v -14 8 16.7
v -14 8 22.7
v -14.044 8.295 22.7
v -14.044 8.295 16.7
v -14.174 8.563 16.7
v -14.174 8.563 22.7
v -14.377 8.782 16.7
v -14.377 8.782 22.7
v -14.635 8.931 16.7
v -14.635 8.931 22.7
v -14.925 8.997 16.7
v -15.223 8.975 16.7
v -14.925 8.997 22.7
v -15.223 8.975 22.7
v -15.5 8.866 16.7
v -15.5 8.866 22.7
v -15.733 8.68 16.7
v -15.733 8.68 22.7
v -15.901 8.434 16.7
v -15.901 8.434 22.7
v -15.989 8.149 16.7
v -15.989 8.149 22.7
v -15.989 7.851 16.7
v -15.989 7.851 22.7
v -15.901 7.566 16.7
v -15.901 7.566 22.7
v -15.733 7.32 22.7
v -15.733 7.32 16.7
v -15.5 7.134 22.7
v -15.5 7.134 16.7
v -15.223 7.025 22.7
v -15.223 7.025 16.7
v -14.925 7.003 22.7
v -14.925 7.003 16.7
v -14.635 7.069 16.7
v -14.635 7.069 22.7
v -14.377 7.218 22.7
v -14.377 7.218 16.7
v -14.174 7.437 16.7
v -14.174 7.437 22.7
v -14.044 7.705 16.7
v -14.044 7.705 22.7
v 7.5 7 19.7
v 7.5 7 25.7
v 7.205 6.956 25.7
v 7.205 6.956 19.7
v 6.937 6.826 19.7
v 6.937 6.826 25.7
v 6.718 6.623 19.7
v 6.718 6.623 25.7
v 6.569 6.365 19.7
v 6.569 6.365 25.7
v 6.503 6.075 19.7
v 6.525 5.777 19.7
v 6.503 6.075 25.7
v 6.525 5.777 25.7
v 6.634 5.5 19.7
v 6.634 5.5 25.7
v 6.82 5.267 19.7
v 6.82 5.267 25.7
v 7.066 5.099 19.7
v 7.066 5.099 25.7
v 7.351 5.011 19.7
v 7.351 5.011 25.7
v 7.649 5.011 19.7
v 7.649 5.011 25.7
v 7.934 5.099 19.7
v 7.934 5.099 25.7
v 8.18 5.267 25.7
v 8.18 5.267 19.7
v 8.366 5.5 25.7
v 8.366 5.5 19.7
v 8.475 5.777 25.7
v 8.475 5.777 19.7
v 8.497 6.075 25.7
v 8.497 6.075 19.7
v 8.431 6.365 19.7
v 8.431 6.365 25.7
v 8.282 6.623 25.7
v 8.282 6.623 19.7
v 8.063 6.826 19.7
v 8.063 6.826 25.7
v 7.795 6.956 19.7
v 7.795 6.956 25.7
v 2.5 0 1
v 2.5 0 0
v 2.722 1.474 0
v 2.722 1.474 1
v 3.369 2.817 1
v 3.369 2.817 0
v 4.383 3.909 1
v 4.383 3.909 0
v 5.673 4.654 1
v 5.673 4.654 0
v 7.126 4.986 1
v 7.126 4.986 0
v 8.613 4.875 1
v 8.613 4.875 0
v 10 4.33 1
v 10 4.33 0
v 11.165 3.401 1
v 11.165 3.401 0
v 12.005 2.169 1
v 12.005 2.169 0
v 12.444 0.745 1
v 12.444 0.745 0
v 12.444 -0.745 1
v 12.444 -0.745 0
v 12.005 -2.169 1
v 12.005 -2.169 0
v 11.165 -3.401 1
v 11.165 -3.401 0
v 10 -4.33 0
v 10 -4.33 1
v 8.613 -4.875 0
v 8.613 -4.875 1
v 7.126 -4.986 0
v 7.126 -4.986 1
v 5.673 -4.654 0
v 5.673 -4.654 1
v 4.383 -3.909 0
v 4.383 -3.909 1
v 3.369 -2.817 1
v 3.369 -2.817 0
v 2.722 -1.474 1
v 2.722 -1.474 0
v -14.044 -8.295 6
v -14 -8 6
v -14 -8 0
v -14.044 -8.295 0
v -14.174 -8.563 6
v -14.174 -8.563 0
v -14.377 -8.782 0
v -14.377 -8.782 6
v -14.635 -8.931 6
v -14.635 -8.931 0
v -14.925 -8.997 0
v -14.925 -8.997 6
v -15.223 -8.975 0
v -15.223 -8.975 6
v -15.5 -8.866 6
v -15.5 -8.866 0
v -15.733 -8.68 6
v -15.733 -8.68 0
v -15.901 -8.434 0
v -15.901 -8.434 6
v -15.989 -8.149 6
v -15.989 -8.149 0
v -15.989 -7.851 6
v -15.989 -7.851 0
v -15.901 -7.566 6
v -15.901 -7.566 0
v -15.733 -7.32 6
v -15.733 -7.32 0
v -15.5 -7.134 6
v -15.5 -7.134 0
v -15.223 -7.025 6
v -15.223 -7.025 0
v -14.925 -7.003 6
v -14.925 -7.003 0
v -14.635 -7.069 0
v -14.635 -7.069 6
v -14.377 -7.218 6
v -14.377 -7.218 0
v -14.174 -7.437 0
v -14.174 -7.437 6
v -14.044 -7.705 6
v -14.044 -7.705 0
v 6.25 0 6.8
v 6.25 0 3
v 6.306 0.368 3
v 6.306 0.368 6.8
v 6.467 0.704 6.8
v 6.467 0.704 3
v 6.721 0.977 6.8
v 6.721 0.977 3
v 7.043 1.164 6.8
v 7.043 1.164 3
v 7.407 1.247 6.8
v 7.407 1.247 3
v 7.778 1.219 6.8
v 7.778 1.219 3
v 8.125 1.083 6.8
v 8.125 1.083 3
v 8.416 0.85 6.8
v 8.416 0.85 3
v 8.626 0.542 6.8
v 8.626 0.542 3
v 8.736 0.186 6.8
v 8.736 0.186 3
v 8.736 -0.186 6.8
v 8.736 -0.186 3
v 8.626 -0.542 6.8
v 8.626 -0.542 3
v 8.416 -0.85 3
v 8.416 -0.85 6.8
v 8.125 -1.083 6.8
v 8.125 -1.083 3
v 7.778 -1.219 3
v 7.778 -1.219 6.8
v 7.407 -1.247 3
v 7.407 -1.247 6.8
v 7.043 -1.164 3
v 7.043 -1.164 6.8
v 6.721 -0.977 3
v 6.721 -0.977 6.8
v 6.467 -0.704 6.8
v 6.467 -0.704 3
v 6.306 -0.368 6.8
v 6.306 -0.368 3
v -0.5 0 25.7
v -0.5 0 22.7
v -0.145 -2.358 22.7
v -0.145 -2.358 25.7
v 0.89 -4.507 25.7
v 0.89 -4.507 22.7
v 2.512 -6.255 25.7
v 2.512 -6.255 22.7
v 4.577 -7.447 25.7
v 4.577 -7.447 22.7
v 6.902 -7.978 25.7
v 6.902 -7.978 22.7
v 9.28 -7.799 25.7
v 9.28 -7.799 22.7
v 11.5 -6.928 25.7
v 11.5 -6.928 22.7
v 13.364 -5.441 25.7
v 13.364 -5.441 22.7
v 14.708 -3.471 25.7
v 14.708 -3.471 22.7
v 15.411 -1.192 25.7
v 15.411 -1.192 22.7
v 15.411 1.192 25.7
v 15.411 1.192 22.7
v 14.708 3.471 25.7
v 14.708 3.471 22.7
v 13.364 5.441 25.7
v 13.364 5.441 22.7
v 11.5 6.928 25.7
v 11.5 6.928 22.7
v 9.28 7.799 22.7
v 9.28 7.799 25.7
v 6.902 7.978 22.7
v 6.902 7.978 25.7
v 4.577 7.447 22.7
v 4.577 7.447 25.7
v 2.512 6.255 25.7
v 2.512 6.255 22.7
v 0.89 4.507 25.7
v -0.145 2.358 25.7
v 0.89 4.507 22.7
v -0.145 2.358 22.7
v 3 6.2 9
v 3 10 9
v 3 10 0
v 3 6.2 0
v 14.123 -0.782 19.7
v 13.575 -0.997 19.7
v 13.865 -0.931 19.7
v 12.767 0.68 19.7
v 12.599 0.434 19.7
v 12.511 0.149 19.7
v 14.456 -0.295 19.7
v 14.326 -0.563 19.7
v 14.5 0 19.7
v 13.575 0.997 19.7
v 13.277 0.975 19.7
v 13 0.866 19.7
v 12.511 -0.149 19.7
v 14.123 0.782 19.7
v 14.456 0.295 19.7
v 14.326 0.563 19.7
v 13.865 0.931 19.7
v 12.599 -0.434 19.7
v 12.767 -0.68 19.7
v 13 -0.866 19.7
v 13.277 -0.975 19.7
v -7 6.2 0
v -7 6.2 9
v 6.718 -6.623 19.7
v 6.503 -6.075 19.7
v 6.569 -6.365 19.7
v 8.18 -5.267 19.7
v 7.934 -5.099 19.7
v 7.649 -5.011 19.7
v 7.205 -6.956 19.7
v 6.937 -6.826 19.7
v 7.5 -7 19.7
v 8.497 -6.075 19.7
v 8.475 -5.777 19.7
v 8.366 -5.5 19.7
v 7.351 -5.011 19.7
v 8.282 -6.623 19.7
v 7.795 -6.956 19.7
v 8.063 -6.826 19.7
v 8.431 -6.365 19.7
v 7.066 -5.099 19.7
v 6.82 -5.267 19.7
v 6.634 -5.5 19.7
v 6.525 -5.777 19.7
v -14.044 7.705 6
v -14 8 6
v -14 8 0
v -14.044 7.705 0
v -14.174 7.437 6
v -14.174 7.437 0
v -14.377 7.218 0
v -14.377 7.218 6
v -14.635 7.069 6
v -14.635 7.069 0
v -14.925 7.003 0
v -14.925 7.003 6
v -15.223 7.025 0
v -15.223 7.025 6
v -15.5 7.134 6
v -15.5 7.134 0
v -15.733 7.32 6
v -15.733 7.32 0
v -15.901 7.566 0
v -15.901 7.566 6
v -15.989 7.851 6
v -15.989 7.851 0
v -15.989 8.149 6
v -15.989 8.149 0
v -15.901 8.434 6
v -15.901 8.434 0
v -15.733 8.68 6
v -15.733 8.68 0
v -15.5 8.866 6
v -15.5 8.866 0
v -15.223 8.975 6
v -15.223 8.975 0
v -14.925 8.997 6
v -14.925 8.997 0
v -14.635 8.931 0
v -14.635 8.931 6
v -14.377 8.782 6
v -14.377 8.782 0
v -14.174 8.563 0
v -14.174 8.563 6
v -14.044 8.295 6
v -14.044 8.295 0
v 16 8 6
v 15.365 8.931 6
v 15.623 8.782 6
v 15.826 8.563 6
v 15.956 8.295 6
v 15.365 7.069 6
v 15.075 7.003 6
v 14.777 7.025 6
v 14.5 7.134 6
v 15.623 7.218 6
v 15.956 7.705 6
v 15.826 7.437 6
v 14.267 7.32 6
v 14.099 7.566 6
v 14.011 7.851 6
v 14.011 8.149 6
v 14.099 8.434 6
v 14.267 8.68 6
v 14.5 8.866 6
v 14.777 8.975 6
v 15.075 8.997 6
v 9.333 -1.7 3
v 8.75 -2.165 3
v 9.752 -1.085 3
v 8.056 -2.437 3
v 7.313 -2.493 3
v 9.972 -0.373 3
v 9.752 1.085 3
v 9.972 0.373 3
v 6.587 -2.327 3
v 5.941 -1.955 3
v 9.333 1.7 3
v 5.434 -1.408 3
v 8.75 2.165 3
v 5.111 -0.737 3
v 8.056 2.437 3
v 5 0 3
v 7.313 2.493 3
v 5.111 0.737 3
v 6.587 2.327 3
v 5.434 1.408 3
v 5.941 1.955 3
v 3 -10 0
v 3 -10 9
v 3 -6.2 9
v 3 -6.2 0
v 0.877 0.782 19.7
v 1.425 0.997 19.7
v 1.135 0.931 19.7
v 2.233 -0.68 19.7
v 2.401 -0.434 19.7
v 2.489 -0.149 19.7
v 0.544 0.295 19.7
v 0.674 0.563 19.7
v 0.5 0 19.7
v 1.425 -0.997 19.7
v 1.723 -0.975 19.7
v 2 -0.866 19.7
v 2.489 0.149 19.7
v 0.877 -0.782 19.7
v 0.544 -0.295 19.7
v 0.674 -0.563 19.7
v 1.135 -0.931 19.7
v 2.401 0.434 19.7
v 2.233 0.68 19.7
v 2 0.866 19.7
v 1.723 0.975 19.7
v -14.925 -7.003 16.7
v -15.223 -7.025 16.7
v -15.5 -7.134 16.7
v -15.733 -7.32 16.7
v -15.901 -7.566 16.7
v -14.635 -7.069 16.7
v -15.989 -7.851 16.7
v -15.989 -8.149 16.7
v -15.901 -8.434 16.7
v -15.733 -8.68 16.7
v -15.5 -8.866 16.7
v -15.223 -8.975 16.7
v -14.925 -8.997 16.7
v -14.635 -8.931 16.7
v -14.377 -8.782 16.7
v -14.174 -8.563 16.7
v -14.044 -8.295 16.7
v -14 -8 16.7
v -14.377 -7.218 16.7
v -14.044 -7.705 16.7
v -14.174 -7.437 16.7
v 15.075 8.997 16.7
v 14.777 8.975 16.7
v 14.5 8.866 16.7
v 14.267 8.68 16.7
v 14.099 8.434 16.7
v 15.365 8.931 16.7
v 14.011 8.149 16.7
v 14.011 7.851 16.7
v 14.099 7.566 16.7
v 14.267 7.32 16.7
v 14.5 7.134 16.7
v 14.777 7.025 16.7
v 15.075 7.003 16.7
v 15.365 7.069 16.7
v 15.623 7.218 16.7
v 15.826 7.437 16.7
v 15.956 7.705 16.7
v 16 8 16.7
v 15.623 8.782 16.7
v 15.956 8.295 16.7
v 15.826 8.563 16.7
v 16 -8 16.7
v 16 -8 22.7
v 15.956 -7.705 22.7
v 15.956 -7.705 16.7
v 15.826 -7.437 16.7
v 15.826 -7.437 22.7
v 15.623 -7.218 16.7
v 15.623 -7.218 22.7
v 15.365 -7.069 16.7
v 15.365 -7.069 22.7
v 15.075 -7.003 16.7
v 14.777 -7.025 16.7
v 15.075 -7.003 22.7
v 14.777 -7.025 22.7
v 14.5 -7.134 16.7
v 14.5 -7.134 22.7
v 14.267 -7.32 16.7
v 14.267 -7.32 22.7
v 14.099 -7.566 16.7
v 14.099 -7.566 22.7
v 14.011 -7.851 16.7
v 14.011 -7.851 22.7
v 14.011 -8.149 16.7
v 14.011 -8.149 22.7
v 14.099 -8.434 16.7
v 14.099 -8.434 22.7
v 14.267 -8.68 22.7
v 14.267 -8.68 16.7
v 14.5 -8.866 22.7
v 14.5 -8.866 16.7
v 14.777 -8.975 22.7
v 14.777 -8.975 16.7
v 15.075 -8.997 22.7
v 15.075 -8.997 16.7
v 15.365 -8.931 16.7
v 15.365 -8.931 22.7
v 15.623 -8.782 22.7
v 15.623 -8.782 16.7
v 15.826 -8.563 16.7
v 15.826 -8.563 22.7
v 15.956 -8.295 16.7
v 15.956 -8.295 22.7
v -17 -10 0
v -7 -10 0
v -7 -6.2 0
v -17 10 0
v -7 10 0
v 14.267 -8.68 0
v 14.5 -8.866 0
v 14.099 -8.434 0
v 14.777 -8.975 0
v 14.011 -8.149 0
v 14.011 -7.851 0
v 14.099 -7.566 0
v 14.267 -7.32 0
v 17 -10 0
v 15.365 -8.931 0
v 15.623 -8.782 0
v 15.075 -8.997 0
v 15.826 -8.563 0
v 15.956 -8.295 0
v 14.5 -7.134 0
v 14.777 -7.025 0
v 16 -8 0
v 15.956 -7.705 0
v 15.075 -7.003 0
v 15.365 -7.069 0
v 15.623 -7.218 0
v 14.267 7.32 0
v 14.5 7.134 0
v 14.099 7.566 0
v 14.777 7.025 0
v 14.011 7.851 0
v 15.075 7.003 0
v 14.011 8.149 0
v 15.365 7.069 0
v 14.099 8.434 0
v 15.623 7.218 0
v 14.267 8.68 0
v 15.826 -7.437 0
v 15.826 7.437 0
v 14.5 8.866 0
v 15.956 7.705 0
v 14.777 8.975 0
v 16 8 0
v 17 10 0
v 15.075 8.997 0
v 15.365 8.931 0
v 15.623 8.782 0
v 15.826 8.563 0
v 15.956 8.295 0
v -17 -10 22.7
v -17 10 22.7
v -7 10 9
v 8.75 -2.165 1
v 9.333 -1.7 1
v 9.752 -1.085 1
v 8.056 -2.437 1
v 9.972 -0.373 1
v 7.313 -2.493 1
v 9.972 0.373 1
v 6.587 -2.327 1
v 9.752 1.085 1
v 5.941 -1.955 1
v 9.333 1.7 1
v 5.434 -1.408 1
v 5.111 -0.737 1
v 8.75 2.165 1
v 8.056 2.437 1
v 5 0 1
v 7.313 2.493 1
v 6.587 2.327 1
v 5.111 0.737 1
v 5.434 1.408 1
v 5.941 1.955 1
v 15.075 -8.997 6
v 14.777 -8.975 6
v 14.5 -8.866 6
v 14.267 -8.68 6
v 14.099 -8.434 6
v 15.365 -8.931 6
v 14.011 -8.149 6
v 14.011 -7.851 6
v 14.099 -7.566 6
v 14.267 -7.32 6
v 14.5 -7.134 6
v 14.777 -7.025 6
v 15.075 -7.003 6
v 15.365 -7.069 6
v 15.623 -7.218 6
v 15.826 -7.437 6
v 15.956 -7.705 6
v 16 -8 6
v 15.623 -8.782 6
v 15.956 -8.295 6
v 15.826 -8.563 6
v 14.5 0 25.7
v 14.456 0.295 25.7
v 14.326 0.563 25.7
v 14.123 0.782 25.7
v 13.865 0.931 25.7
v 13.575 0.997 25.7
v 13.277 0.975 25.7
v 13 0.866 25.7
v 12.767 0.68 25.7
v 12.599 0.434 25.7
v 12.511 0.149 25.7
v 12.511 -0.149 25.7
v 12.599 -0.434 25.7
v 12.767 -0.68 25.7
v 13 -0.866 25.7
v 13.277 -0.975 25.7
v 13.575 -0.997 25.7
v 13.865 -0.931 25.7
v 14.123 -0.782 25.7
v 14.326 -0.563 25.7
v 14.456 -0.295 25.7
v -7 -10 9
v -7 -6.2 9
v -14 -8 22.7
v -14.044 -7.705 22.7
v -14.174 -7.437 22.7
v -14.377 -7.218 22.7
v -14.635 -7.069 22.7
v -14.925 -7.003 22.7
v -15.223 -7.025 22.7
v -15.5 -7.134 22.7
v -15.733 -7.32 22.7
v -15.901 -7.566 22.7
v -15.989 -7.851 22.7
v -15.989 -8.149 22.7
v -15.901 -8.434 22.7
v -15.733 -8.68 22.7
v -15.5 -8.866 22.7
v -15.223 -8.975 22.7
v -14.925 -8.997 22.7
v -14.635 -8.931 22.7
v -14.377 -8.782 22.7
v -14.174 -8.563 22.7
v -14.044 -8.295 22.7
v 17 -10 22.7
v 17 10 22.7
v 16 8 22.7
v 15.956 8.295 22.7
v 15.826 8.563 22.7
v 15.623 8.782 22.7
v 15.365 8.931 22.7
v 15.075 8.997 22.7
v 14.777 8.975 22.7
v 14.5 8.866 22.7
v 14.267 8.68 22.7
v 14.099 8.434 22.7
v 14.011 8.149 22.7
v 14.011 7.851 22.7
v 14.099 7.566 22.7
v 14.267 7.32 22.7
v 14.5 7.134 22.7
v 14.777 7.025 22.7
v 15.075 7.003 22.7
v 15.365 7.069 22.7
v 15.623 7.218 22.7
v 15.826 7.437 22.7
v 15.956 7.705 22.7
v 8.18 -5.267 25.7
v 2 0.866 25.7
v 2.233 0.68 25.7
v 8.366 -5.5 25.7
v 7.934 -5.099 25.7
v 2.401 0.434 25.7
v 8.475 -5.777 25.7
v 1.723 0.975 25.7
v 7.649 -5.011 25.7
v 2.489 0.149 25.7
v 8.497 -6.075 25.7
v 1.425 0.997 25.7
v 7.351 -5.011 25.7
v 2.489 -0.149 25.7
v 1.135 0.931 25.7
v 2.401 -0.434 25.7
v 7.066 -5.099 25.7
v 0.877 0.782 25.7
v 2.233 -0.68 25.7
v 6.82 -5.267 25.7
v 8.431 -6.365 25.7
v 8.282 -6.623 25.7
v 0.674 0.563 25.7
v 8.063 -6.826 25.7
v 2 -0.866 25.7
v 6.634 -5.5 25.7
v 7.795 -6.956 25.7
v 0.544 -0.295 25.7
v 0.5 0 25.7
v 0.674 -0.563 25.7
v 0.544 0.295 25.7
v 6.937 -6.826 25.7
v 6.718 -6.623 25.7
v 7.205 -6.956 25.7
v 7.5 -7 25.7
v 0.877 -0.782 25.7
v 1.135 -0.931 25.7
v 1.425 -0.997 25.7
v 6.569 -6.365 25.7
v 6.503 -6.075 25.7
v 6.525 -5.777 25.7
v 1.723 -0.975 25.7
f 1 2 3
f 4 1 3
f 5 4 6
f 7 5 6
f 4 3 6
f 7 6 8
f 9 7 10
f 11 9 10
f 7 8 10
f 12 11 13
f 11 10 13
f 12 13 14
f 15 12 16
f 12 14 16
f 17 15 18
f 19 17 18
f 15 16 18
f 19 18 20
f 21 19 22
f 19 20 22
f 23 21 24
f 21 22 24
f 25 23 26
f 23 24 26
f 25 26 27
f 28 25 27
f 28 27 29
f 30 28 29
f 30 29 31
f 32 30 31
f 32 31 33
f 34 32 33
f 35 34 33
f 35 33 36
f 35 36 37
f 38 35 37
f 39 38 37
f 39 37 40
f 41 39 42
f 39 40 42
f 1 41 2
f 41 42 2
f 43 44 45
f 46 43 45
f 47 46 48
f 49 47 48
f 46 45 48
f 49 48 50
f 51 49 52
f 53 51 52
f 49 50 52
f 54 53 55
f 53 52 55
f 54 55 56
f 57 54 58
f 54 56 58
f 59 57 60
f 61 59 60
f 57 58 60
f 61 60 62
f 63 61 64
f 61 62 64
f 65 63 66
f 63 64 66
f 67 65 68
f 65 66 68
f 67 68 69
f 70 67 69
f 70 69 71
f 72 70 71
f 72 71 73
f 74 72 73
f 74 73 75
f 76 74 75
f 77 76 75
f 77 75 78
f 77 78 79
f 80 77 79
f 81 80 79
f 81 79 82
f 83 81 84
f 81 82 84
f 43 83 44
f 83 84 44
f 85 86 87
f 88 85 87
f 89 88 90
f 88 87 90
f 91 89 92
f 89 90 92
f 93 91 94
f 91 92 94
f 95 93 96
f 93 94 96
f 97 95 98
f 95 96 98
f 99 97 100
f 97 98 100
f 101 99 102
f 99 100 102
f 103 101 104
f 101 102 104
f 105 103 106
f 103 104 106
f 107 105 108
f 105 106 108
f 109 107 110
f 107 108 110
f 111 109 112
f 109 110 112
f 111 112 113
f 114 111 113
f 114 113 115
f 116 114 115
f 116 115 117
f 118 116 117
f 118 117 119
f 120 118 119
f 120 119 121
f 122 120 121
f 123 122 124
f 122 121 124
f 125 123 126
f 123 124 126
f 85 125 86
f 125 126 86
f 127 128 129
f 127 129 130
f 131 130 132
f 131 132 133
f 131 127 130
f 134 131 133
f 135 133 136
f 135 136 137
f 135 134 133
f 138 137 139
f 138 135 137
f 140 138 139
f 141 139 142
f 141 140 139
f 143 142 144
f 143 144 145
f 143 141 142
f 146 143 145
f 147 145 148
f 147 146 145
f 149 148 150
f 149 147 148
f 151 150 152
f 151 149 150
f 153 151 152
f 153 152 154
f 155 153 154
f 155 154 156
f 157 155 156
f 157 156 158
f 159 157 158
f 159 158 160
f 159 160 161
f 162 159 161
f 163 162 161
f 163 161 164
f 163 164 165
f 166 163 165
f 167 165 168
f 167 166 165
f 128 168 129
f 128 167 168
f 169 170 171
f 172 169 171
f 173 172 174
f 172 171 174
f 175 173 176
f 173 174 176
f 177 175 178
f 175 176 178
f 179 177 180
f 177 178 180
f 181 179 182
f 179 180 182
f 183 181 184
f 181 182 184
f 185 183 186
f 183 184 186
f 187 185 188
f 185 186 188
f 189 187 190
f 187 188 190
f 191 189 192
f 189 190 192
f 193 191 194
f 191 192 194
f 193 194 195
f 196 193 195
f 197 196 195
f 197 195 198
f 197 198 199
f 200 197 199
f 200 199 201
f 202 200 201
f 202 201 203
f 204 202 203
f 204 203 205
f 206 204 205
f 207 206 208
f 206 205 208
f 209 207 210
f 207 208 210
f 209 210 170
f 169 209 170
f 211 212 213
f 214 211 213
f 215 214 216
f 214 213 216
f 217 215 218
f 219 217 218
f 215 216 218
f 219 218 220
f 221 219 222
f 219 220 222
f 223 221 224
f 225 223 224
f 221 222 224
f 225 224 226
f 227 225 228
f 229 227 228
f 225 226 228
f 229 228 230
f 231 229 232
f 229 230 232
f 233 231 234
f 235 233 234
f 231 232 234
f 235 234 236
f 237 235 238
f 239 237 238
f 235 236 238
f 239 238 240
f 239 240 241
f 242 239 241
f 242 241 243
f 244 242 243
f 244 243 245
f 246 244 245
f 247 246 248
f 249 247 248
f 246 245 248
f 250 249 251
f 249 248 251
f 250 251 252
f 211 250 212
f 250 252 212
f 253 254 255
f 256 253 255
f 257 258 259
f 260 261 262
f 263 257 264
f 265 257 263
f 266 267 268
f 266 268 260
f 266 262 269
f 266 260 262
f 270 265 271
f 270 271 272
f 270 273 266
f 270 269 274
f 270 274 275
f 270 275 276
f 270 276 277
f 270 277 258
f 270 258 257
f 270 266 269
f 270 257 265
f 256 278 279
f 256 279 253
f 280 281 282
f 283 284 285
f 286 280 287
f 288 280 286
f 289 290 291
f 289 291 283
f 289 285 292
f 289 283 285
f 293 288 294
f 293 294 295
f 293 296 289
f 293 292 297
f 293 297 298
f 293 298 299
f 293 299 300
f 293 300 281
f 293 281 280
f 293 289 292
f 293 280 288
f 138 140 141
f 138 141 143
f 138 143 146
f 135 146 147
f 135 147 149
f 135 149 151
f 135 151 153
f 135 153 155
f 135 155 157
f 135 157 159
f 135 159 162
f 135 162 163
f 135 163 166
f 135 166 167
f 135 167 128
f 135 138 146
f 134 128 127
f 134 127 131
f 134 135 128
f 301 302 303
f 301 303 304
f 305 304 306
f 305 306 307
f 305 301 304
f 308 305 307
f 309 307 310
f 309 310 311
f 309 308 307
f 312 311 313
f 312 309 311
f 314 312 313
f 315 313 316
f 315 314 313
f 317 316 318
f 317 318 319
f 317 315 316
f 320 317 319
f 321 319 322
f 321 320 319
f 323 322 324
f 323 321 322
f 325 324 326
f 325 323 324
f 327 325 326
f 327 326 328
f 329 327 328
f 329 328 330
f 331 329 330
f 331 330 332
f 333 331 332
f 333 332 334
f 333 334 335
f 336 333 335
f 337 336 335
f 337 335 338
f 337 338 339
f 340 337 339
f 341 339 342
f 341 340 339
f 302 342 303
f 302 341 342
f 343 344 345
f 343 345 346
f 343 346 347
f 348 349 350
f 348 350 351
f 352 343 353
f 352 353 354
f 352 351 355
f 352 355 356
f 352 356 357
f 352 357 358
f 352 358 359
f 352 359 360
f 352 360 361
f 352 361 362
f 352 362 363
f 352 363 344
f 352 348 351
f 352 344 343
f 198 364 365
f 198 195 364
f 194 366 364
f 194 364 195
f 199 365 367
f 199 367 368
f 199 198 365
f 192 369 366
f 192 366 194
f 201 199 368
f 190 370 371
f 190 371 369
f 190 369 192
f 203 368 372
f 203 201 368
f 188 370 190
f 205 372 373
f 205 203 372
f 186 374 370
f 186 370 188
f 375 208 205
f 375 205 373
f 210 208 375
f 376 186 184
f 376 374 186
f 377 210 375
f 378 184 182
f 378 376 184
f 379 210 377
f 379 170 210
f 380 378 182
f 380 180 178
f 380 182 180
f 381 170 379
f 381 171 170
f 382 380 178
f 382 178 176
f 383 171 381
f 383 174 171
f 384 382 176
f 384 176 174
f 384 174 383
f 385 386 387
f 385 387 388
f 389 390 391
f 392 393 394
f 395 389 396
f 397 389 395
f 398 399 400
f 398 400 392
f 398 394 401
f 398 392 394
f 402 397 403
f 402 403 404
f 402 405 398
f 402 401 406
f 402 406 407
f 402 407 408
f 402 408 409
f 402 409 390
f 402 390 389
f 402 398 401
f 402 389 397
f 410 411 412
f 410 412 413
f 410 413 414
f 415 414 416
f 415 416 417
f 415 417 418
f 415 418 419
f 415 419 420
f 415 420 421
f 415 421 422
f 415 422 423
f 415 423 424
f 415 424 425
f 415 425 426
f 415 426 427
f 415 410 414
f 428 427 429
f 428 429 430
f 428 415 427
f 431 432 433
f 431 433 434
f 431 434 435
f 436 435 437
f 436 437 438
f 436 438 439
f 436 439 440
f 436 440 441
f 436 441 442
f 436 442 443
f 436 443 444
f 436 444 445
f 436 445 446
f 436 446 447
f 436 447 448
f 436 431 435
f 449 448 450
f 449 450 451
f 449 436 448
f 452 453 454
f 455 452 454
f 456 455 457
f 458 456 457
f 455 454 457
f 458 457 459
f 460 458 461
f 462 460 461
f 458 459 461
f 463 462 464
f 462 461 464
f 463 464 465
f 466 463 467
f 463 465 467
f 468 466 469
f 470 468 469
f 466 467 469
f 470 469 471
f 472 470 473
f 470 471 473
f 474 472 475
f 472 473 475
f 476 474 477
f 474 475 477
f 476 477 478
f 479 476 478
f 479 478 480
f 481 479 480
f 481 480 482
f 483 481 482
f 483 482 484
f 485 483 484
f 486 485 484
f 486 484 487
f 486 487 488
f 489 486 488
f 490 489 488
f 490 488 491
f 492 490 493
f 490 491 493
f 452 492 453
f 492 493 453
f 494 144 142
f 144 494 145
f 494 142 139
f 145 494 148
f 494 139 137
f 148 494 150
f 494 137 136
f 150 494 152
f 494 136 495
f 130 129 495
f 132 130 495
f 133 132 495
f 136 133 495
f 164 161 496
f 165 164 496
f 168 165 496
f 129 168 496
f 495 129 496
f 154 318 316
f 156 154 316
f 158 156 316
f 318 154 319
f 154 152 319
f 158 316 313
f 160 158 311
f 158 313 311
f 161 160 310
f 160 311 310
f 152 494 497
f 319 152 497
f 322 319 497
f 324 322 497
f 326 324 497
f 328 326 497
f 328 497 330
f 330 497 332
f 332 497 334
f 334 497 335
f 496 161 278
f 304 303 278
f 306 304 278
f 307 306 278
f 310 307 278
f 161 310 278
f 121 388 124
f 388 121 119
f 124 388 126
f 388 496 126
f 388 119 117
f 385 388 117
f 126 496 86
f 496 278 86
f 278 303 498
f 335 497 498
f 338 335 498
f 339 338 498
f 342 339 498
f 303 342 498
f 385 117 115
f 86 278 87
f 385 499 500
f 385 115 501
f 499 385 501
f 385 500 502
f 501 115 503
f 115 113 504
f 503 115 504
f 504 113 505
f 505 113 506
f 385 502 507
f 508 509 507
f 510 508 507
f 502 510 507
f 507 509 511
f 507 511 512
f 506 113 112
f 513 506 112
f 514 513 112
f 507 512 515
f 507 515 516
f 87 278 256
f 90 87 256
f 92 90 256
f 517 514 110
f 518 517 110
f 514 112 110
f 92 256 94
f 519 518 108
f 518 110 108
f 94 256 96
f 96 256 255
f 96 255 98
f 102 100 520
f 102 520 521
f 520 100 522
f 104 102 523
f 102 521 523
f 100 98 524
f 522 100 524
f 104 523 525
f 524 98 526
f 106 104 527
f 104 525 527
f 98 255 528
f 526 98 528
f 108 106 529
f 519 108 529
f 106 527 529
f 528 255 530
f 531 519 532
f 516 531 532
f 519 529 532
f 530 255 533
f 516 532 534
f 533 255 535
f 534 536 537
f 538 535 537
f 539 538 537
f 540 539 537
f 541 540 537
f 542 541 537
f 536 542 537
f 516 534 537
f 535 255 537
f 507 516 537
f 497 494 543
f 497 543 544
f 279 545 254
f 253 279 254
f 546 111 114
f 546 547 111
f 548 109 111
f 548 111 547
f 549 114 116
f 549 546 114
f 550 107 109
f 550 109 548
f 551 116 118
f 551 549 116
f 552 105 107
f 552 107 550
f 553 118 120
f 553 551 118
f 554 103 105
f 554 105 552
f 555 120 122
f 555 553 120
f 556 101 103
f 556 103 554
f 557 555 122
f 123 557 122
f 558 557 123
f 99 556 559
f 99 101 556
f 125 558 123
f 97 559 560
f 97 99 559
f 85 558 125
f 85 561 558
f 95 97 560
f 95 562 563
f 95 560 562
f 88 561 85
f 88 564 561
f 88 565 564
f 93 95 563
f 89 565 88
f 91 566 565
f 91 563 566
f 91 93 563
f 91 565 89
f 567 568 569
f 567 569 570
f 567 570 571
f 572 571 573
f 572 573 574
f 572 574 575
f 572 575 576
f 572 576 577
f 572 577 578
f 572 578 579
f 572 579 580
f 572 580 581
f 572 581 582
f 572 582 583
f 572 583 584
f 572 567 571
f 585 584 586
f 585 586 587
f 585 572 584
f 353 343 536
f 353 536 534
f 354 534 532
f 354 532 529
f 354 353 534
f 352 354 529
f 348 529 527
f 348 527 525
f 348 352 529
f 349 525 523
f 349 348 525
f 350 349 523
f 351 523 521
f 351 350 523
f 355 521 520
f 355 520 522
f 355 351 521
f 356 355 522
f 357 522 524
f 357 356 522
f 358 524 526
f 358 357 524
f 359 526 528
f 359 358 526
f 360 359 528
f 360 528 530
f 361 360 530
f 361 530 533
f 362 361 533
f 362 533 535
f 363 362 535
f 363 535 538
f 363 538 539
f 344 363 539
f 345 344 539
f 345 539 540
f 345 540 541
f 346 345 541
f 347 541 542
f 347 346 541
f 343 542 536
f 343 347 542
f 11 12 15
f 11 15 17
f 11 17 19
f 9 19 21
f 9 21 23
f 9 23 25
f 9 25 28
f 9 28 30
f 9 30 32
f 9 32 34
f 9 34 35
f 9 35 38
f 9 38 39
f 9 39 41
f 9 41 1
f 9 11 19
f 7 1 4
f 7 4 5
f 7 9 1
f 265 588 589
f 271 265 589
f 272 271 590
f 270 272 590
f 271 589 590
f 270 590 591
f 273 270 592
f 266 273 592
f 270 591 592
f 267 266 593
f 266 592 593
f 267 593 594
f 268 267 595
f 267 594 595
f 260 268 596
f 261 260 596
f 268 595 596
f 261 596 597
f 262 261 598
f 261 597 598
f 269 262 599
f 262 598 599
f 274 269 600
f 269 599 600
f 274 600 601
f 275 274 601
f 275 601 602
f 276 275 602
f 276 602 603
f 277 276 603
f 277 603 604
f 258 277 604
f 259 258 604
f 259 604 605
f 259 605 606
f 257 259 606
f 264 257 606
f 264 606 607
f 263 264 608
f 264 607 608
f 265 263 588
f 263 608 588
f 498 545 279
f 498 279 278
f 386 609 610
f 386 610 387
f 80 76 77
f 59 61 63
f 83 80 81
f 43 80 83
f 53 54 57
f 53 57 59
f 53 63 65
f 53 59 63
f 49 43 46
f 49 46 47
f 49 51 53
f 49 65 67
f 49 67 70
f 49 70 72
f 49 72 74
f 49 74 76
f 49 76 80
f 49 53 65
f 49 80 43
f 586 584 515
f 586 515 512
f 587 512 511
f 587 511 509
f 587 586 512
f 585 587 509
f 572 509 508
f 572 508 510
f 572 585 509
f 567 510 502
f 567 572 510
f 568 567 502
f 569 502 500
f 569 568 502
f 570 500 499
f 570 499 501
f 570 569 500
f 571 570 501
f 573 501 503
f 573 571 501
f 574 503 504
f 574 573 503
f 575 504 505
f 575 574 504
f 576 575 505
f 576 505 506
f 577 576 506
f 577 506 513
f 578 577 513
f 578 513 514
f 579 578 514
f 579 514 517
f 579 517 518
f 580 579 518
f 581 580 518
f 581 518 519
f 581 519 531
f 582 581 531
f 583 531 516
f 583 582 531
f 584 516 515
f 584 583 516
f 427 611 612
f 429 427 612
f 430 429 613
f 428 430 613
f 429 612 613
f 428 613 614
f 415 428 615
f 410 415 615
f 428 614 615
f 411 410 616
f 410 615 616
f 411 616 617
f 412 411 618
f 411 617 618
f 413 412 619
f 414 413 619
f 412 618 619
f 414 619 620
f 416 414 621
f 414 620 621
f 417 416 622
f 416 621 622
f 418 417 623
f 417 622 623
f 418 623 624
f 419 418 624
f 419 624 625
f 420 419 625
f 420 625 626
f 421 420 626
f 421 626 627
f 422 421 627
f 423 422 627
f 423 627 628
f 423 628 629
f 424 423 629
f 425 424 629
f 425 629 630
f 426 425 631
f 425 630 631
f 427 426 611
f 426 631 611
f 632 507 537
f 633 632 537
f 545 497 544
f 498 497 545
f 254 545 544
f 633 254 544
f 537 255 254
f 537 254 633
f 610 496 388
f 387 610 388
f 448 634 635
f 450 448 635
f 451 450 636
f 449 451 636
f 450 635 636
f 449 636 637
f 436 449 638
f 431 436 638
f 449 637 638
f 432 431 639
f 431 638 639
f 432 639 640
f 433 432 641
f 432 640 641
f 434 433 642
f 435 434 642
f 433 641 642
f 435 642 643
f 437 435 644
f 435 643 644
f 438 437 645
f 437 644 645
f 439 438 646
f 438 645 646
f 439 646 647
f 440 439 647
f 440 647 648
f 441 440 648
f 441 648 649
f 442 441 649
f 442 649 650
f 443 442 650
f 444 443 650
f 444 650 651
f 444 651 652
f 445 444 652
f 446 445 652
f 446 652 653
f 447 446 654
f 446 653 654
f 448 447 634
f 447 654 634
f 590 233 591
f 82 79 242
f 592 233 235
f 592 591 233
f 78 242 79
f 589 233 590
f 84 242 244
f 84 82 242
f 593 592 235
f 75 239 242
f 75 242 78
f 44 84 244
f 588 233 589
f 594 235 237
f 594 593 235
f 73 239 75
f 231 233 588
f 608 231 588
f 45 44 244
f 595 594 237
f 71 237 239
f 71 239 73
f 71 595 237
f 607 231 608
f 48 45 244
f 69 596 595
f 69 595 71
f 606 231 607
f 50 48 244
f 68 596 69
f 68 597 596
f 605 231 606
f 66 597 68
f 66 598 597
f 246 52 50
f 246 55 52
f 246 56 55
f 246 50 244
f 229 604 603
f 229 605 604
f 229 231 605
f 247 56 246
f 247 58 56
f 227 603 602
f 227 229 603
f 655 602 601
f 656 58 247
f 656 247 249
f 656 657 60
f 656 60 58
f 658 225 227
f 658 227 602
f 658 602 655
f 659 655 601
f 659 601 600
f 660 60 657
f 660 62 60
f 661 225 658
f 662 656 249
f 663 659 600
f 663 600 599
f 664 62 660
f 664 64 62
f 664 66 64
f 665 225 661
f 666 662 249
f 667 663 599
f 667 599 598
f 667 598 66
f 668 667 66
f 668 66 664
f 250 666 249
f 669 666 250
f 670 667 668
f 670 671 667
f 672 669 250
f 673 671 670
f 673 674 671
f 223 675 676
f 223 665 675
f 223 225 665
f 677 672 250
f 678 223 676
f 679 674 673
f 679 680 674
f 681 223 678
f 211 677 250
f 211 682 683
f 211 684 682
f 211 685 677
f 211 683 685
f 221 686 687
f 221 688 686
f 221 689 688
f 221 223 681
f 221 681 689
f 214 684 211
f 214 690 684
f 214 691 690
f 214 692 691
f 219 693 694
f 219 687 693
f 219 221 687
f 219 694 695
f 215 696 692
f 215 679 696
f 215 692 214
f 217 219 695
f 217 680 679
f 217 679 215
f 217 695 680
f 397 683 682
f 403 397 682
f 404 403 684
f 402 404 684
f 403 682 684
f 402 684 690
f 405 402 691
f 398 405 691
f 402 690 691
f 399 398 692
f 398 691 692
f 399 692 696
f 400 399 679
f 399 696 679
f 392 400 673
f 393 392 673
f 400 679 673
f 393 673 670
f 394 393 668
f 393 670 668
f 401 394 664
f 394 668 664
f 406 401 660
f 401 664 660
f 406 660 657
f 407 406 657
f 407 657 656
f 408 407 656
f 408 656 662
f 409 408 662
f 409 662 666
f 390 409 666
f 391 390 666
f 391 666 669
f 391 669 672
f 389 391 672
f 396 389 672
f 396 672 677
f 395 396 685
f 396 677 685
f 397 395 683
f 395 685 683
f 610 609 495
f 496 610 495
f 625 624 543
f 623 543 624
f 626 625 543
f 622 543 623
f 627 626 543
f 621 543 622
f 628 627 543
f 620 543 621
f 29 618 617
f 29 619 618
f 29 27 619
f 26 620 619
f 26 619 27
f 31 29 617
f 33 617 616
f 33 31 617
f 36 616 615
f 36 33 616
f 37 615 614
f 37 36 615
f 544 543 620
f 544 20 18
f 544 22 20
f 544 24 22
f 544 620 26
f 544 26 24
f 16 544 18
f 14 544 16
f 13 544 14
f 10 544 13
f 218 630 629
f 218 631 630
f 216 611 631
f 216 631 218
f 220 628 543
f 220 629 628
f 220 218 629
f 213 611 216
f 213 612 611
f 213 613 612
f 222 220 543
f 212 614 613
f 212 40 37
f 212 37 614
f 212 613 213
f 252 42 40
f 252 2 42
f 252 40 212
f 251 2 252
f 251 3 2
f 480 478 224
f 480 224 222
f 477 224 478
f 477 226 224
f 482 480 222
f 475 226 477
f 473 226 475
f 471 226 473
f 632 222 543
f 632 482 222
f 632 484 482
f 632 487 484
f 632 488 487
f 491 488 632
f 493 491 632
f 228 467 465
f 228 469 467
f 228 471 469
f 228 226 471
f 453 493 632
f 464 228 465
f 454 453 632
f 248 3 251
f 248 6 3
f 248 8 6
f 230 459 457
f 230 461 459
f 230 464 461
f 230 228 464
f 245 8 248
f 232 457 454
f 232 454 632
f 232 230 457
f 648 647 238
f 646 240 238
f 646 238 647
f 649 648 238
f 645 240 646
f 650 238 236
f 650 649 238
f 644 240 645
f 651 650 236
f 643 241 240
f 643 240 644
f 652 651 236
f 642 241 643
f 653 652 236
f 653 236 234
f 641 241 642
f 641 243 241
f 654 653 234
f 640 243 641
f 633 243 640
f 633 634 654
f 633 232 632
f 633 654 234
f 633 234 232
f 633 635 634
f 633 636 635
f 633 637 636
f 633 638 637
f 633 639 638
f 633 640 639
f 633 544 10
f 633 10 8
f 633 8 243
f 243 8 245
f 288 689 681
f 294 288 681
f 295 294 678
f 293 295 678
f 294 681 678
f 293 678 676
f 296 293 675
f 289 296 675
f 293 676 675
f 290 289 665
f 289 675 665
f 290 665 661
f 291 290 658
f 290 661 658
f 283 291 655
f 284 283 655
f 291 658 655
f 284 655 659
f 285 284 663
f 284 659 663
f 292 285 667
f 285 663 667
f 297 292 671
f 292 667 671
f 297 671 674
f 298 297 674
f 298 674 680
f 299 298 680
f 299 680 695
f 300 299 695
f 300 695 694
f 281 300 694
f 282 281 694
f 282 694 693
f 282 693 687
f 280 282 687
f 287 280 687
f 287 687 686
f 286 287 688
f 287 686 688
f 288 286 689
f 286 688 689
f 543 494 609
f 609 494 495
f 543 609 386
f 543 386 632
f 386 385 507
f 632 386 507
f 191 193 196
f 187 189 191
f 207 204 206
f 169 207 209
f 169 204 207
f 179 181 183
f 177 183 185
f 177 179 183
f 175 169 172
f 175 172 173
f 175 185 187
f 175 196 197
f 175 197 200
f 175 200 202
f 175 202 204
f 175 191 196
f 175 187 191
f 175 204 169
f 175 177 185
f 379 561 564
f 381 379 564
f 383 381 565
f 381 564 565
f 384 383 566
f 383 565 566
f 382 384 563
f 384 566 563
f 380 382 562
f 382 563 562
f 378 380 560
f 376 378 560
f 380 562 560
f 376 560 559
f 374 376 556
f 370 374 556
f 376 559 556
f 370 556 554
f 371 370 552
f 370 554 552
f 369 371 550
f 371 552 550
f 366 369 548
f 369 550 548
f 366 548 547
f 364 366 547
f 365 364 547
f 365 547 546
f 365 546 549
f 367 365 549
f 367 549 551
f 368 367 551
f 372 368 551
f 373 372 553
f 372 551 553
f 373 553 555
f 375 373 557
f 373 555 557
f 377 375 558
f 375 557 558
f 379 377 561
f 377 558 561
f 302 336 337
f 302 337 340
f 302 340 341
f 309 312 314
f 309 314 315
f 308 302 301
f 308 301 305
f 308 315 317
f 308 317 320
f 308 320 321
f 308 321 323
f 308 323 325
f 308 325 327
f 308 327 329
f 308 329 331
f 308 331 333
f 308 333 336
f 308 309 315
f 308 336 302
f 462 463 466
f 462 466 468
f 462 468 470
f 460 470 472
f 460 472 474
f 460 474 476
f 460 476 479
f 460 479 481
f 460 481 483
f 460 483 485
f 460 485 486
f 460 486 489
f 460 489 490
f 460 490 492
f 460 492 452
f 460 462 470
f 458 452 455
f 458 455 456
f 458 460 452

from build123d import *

# Parameters (mm, degrees)
SKETCH_1_W               = 34
SKETCH_1_H               = 20
EXTRUDE_1_DEPTH          = 22.7
SKETCH_2_R               = 8
EXTRUDE_2_DEPTH          = 3
SKETCH_3_R               = 1
CUT_EXTRUDE_1_DEPTH      = 6
CUT_EXTRUDE_START        = -6
SKETCH_5_R               = 1
CUT_EXTRUDE_2_DEPTH      = 6
SKETCH_6_R               = 5
CUT_EXTRUDE_3_DEPTH      = 1
SKETCH_7_R               = 2.5
CUT_EXTRUDE_4_DEPTH      = 2
SKETCH_8_W               = 10
SKETCH_8_H               = 9
CUT_EXTRUDE_5_DEPTH      = 3.8
SKETCH_9_R               = 1.25
CUT_EXTRUDE_6_DEPTH      = 3.8
SKETCH_10_R              = 1
CUT_EXTRUDE_7_DEPTH      = 6
PATTERN_CIRCULAR_1_COUNT = 4


with BuildPart() as part:
    # 草图1 → 凸台-拉伸1 (new body)
    with BuildSketch(Plane.XY):
        Rectangle(SKETCH_1_W, SKETCH_1_H)
    extrude(amount=EXTRUDE_1_DEPTH)

    # 草图2 → 凸台-拉伸2 (add)
    with BuildSketch(Plane.XY.offset(22.7)):
        with Locations(Location((7.5, 0, 0), (0, 0, 180))):
            Circle(SKETCH_2_R)
    extrude(amount=EXTRUDE_2_DEPTH)

    # 草图3 → 切除-拉伸1 (cut)
    with BuildSketch(Plane.XY.offset(22.7)):
        with Locations((-15, 8)):
            Circle(SKETCH_3_R)
        with Locations((15, 8)):
            Circle(SKETCH_3_R)
        with Locations((-15, -8)):
            Circle(SKETCH_3_R)
        with Locations((15, -8)):
            Circle(SKETCH_3_R)
    extrude(amount=-CUT_EXTRUDE_1_DEPTH, mode=Mode.SUBTRACT)

    # 草图5 → 切除-拉伸2 (cut)
    with BuildSketch(Plane(origin=(0, 0, 0), x_dir=(-1, 0, 0), z_dir=(0, 0, -1)).offset(CUT_EXTRUDE_START)):
        with Locations(Location((-15, 8, 0), (0, 0, 180))):
            Circle(SKETCH_5_R)
        with Locations(Location((15, 8, 0), (0, 0, 180))):
            Circle(SKETCH_5_R)
        with Locations(Location((-15, -8, 0), (0, 0, 180))):
            Circle(SKETCH_5_R)
        with Locations(Location((15, -8, 0), (0, 0, 180))):
            Circle(SKETCH_5_R)
    extrude(amount=CUT_EXTRUDE_2_DEPTH, mode=Mode.SUBTRACT)

    # 草图6 → 切除-拉伸3 (cut)
    with BuildSketch(Plane(origin=(0, 0, 0), x_dir=(-1, 0, 0), z_dir=(0, 0, -1))):
        with Locations((-7.5, 0)):
            Circle(SKETCH_6_R)
    extrude(amount=-CUT_EXTRUDE_3_DEPTH, mode=Mode.SUBTRACT)

    # 草图7 → 切除-拉伸4 (cut)
    with BuildSketch(Plane(origin=(0, 0, 1), x_dir=(-1, 0, 0), z_dir=(0, 0, -1))):
        with Locations((-7.5, 0)):
            Circle(SKETCH_7_R)
    extrude(amount=-CUT_EXTRUDE_4_DEPTH, mode=Mode.SUBTRACT)

    # 草图8 → 切除-拉伸5 (cut)
    with BuildSketch(Plane(origin=(0, 10, 0), x_dir=(1, 0, 0), z_dir=(0, 1, 0))):
        with Locations((-2, -4.5)):
            Rectangle(SKETCH_8_W, SKETCH_8_H)
    cut_extrude_5 = extrude(amount=-CUT_EXTRUDE_5_DEPTH, mode=Mode.SUBTRACT)

    # 镜向1: 切除-拉伸5 across plane
    add(cut_extrude_5.mirror(Plane.ZX), mode=Mode.SUBTRACT)

    # 草图9 → 切除-拉伸6 (cut)
    with BuildSketch(Plane(origin=(0, 0, 3), x_dir=(-1, 0, 0), z_dir=(0, 0, -1))):
        with Locations((-7.5, 0)):
            Circle(SKETCH_9_R)
    extrude(amount=-CUT_EXTRUDE_6_DEPTH, mode=Mode.SUBTRACT)

    # 草图10 → 切除-拉伸7 (cut)
    with BuildSketch(Plane.XY.offset(25.7)):
        with Locations((13.5, 0)):
            Circle(SKETCH_10_R)
    cut_extrude_7 = extrude(amount=-CUT_EXTRUDE_7_DEPTH, mode=Mode.SUBTRACT)

    # 阵列(圆周)1: 切除-拉伸7 ×4 about axis
    pattern_circular_1_axis = Axis((7.5, 0, 0), (0, 0, 1))
    for i in range(1, PATTERN_CIRCULAR_1_COUNT):
        add(cut_extrude_7.rotate(pattern_circular_1_axis, i * 360 / PATTERN_CIRCULAR_1_COUNT), mode=Mode.SUBTRACT)


solid = part.part
